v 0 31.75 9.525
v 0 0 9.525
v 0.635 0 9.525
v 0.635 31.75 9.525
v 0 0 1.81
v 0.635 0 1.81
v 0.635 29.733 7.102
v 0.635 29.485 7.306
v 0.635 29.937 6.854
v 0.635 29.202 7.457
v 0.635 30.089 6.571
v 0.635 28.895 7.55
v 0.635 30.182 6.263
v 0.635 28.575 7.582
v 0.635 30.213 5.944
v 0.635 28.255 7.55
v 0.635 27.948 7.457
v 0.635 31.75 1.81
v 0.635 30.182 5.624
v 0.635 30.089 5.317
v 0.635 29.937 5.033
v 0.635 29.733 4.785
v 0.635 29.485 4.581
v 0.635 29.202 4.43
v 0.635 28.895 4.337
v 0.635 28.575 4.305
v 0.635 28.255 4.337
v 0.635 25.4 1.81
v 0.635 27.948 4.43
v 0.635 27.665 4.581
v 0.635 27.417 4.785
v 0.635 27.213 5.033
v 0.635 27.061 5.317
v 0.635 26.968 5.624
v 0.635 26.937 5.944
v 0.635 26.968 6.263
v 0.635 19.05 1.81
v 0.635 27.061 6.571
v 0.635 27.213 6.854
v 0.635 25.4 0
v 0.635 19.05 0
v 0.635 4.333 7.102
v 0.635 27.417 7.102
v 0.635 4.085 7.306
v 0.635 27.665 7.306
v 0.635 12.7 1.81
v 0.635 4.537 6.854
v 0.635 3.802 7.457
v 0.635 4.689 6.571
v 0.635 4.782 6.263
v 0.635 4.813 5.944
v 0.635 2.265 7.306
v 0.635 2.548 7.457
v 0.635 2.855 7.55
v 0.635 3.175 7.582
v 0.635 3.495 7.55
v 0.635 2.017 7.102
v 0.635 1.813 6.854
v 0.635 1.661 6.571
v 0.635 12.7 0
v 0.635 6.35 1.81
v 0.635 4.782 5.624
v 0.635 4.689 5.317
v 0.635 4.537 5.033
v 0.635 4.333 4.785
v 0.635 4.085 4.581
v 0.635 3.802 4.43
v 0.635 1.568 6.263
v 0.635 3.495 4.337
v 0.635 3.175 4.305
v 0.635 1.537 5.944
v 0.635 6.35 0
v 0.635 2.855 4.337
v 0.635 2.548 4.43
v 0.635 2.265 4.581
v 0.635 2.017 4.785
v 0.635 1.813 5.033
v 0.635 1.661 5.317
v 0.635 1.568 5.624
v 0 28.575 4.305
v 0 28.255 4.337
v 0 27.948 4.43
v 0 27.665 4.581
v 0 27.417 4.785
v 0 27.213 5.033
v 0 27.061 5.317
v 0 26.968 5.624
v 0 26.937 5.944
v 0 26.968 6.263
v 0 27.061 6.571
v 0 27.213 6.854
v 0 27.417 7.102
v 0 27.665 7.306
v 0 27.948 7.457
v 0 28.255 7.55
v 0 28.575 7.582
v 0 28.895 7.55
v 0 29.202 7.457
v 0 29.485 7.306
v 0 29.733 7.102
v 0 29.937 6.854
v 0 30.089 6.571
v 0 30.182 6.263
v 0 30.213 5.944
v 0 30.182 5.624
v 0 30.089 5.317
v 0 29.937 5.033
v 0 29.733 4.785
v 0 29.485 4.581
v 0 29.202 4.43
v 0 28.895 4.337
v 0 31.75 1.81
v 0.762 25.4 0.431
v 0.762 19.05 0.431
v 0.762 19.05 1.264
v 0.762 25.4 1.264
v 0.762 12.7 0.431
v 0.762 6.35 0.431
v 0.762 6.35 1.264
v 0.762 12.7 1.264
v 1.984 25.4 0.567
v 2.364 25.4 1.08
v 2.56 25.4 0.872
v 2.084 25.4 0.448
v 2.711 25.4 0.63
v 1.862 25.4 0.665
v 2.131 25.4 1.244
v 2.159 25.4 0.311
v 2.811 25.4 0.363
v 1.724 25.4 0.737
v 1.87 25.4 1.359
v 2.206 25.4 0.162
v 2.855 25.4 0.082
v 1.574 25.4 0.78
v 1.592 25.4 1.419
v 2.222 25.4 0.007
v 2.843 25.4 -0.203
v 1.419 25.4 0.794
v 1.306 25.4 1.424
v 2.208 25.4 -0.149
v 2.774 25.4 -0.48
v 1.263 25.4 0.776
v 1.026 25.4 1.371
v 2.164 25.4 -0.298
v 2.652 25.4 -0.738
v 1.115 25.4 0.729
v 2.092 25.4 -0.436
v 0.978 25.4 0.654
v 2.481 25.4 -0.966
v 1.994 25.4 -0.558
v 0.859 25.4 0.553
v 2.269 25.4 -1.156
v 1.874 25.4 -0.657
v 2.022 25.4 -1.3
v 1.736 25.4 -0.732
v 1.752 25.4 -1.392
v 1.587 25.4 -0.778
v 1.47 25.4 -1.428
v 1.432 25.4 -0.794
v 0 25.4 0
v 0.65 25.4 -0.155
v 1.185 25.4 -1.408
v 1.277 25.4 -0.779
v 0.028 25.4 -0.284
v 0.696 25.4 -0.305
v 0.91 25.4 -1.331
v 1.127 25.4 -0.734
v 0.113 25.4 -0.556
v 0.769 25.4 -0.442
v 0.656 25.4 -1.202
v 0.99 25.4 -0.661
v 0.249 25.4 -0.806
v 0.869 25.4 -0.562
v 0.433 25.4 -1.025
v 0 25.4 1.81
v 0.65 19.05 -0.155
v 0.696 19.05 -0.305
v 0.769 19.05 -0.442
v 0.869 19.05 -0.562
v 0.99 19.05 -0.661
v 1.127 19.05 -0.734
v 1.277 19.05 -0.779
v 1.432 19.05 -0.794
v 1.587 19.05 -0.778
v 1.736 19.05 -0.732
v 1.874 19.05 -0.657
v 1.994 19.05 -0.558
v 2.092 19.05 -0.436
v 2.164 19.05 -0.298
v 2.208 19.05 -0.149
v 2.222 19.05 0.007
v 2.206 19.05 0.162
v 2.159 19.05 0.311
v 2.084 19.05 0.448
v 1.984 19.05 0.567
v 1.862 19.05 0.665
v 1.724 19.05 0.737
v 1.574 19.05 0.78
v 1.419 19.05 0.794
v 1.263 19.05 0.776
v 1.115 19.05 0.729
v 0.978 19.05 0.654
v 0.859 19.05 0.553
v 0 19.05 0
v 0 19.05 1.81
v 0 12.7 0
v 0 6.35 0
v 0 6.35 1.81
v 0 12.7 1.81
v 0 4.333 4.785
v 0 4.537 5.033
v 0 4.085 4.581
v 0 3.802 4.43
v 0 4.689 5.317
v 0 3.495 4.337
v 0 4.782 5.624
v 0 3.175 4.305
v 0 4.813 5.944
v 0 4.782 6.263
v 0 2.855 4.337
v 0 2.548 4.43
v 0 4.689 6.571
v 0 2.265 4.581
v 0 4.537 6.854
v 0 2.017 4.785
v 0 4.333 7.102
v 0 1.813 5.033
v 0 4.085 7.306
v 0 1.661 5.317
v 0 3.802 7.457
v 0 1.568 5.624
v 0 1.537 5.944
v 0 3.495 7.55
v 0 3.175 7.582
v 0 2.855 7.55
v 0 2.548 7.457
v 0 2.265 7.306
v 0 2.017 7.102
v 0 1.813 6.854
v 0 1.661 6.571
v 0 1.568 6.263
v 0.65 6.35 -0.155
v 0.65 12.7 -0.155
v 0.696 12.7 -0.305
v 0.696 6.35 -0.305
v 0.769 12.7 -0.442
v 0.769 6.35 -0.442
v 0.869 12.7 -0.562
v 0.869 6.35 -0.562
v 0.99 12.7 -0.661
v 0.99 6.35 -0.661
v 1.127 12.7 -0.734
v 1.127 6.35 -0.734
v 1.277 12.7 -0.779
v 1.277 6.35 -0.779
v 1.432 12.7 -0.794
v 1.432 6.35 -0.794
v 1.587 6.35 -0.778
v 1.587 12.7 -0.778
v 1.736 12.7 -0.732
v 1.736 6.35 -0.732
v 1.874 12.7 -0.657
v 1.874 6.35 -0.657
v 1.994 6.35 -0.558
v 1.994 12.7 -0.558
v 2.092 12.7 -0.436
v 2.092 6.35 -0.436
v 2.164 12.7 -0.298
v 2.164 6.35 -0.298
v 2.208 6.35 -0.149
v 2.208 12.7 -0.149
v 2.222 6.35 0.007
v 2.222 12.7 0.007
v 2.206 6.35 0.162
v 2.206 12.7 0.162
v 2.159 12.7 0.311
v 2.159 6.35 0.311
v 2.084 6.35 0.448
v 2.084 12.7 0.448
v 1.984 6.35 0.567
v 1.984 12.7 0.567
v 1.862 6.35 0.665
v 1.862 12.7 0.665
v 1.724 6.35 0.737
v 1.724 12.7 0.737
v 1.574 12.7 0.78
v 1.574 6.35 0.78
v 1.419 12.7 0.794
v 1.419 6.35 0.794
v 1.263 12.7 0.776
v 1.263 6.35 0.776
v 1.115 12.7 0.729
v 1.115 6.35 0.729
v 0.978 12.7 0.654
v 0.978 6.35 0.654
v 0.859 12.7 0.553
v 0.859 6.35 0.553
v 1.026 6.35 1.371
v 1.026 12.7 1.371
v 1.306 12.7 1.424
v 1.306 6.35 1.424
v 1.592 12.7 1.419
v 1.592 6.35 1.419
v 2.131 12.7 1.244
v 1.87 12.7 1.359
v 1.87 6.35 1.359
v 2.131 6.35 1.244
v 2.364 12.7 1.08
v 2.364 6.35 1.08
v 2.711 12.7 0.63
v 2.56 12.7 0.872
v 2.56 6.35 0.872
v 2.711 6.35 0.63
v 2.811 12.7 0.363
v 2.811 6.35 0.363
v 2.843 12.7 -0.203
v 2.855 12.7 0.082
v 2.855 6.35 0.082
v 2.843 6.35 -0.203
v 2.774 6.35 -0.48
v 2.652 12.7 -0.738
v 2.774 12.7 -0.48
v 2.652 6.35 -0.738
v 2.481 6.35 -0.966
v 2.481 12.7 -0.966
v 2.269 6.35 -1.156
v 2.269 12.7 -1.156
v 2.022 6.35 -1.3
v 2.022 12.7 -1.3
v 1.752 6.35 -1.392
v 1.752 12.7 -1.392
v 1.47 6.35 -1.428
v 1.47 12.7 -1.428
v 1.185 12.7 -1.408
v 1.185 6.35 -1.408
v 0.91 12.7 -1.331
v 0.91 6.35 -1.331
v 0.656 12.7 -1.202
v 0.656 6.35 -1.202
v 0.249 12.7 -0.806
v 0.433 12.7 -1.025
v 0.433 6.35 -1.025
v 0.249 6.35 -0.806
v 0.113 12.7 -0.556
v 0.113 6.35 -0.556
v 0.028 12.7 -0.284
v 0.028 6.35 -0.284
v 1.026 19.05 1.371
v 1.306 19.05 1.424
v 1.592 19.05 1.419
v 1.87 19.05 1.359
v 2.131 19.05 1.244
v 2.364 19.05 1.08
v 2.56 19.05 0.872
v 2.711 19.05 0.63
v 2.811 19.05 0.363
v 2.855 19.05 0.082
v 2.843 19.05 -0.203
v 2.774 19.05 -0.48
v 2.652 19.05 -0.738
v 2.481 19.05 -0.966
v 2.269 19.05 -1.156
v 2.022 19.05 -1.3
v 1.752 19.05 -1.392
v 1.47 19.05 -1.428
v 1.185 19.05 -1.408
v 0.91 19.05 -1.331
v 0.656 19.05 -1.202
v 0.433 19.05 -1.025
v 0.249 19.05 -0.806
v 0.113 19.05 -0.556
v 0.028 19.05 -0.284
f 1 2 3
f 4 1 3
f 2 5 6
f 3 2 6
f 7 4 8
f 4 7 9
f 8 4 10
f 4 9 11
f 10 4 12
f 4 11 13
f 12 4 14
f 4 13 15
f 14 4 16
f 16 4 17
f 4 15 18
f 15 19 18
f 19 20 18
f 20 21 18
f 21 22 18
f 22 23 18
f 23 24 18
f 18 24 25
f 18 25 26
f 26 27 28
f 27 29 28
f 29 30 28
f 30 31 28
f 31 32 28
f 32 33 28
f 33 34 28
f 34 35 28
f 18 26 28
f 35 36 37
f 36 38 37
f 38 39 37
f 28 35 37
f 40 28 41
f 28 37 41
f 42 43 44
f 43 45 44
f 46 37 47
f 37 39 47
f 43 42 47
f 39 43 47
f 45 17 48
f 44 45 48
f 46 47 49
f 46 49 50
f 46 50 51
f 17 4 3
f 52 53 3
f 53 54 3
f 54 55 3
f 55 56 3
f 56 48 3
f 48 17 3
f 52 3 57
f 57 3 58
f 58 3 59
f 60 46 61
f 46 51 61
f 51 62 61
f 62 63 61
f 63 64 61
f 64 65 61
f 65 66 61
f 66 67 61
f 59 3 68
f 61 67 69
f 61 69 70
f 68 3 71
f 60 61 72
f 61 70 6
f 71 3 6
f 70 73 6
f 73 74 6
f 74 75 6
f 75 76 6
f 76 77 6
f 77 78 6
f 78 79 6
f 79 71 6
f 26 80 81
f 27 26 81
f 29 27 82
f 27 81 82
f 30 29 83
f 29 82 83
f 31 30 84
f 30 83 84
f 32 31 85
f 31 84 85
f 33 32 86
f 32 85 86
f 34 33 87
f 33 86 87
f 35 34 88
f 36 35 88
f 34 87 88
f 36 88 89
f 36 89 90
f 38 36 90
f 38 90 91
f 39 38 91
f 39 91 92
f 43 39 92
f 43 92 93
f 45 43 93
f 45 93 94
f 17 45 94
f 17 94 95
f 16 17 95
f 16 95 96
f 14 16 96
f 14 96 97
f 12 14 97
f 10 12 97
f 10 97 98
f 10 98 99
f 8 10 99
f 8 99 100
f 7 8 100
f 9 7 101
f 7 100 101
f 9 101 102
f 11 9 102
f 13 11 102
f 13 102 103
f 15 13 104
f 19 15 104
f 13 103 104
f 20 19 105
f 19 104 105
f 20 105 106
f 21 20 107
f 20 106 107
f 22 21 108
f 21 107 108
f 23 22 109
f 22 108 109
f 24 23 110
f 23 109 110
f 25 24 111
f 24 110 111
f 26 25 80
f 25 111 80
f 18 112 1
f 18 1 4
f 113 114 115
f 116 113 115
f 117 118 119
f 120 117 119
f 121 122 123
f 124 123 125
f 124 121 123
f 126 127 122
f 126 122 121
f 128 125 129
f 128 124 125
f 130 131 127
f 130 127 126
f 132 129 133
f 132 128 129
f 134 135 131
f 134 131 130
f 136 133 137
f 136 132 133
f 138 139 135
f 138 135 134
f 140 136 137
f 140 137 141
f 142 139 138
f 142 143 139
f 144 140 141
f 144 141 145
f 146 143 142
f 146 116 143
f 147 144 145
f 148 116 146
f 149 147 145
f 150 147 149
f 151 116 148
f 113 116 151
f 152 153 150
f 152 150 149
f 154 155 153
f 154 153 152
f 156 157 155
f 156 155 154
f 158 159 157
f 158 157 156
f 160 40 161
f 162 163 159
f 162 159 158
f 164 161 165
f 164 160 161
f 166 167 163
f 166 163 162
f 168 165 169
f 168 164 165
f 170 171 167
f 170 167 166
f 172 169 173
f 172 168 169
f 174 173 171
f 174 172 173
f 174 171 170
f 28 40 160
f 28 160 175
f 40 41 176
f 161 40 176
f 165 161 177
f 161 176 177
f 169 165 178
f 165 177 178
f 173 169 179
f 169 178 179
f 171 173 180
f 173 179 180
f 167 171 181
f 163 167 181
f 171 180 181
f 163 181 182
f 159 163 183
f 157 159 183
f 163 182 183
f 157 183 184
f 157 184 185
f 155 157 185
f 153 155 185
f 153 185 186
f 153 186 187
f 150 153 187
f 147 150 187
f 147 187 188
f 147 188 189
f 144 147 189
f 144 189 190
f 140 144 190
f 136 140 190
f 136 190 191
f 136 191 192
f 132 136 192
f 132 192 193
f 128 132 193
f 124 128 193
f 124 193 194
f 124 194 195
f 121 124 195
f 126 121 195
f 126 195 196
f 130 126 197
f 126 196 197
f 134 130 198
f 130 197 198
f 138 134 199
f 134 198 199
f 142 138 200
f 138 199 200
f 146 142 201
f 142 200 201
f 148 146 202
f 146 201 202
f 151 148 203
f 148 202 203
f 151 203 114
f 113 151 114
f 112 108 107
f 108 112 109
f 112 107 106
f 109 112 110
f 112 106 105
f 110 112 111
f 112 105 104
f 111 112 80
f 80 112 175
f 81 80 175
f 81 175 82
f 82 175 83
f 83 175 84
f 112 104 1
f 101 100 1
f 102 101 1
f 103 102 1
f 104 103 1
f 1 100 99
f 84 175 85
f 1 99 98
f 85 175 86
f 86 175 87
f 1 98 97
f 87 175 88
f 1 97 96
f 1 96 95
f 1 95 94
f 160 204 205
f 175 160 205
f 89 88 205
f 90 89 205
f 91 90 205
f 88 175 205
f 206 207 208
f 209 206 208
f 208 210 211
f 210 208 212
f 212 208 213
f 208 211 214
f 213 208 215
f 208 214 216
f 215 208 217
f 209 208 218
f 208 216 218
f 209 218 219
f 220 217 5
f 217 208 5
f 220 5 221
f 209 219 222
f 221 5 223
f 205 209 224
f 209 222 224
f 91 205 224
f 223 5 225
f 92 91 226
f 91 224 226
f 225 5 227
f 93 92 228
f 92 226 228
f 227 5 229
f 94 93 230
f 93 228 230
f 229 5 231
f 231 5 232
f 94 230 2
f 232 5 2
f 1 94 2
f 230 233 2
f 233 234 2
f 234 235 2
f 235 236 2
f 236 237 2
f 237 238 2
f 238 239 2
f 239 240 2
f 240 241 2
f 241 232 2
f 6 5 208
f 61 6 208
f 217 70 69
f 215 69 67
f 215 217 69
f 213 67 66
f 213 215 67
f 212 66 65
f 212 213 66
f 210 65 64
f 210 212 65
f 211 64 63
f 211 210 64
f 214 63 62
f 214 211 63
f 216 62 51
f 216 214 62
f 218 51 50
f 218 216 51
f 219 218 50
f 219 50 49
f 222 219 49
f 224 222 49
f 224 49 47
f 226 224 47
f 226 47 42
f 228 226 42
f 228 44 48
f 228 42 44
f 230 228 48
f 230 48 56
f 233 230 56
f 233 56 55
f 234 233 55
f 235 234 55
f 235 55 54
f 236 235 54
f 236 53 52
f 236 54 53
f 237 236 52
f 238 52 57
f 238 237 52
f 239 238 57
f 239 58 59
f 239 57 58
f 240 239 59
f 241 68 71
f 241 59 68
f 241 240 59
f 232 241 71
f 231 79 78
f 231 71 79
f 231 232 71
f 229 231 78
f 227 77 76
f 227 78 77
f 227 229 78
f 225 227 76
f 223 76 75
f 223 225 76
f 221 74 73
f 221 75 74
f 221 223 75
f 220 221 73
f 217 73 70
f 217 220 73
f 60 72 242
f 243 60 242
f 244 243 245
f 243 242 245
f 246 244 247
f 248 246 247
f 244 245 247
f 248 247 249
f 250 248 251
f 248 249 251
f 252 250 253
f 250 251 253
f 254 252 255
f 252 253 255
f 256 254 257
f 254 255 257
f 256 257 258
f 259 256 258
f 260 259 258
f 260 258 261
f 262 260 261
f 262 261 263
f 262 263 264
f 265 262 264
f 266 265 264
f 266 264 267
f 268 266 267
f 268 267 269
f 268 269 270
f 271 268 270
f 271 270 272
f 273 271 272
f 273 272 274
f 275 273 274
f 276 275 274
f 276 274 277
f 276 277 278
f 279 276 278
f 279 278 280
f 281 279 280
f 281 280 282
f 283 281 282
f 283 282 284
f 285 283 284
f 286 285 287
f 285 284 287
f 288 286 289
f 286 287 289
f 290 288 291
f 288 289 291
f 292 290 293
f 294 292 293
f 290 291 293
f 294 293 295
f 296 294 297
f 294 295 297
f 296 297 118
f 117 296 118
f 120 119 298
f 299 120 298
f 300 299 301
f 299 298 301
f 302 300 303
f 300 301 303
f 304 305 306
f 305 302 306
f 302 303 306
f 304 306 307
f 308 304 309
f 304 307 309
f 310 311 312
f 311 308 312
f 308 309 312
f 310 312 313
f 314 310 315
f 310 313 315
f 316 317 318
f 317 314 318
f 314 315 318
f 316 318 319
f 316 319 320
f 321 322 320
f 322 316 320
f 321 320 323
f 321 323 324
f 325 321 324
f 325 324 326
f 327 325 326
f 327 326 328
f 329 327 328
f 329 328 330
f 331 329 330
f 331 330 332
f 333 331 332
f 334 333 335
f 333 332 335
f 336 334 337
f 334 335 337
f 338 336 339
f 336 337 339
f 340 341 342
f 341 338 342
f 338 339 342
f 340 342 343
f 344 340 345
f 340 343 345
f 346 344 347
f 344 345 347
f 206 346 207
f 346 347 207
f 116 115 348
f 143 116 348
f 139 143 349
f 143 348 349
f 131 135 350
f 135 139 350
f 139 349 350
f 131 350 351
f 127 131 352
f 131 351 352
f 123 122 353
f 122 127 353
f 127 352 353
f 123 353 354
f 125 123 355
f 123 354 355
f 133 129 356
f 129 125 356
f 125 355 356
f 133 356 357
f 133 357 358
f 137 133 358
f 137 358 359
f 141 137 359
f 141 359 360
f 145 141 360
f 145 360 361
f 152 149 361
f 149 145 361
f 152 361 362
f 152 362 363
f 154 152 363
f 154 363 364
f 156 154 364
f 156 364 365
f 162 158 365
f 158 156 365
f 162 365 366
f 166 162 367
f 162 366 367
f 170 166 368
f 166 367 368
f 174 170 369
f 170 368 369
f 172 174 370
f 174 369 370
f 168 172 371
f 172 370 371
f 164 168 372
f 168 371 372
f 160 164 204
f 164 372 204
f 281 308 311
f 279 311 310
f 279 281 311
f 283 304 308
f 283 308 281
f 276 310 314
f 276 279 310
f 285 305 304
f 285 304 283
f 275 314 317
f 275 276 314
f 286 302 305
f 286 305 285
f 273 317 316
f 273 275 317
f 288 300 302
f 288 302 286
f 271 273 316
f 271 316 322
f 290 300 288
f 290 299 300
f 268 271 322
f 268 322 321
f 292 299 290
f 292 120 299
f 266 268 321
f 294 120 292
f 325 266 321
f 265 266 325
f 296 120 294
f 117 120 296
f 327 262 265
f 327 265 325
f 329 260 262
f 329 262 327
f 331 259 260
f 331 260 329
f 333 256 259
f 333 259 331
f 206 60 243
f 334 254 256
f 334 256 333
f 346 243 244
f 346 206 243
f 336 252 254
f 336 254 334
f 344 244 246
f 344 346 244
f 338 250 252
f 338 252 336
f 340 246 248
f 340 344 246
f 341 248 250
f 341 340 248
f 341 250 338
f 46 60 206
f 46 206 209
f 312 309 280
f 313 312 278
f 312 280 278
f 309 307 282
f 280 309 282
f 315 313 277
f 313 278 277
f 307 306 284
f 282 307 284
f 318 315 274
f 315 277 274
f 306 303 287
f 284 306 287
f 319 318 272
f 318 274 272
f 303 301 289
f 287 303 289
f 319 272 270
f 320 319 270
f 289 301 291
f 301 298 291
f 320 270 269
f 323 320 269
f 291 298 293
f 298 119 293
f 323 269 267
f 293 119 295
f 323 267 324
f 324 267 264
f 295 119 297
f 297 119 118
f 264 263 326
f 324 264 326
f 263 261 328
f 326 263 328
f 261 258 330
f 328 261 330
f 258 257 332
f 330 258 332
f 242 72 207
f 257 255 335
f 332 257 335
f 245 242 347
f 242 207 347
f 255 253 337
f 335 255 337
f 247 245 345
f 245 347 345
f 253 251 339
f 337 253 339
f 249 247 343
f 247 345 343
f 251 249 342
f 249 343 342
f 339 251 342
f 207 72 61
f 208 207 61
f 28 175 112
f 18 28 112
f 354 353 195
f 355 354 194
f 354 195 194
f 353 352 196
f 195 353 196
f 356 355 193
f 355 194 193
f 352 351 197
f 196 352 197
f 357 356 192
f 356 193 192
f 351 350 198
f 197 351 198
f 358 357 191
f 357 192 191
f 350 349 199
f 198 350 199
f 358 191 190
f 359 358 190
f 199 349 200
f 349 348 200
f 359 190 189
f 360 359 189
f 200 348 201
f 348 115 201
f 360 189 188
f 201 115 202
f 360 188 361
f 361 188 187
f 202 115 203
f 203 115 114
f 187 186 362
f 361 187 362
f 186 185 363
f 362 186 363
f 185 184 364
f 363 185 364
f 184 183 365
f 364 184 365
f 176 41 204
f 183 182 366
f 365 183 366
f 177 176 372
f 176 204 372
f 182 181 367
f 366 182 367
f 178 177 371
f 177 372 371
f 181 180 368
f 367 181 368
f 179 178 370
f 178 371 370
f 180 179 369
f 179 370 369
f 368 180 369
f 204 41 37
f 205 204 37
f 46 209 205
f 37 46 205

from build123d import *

# Parameters (mm, degrees)
BOSS_EXTRUDE2_DEPTH = 31.75
SKETCH8_W           = 3.6195
SKETCH8_H           = 6.35
CUT_EXTRUDE3_DEPTH  = 3.8575
SKETCH15_R          = 1.6383
CUT_EXTRUDE5_DEPTH  = 3.8575


with BuildPart() as part:
    # Sketch4 → Boss-Extrude2 (new body)
    with BuildSketch(Plane(origin=(0, 0, 0), x_dir=(1, 0, 0), z_dir=(0, 1, 0))):
        with BuildLine():
            Line((0, 0), (0, -9.525))
            Line((0, -9.525), (0.635, -9.525))
            Line((0.635, -9.525), (0.635, 0))
            ThreePointArc((0.635, 0), (2.190088254, 0.224506403), (0.762, -0.430677954))
            Line((0.762, -0.430677954), (0.762, -1.263634045))
            ThreePointArc((0.762, -1.263634045), (2.652258403, 0.737803327), (0, 0))
        make_face()
    extrude(amount=BOSS_EXTRUDE2_DEPTH)

    # Sketch8 → Cut-Extrude3 (cut, through all)
    with BuildSketch(Plane(origin=(0, 0, 0), x_dir=(0, 0, -1), z_dir=(1, 0, 0))):
        with Locations((0, 3.175)):
            Rectangle(SKETCH8_W, SKETCH8_H)
        with Locations((0, 15.875)):
            Rectangle(SKETCH8_W, SKETCH8_H)
        with Locations((0, 28.575)):
            Rectangle(SKETCH8_W, SKETCH8_H)
    extrude(amount=CUT_EXTRUDE3_DEPTH, mode=Mode.SUBTRACT)

    # Sketch15 → Cut-Extrude5 (cut, through all)
    with BuildSketch(Plane(origin=(0, 0, 0), x_dir=(0, 0, -1), z_dir=(1, 0, 0))):
        with Locations((-5.9436, 3.175)):
            Circle(SKETCH15_R)
    cut_extrude5 = extrude(amount=CUT_EXTRUDE5_DEPTH, mode=Mode.SUBTRACT)

    # Mirror1: Cut-Extrude5 across plane
    add(cut_extrude5.mirror(Plane(origin=(0, 15.875, 0), x_dir=(0, 0, 1), z_dir=(0, -1, 0))), mode=Mode.SUBTRACT)


solid = part.part
